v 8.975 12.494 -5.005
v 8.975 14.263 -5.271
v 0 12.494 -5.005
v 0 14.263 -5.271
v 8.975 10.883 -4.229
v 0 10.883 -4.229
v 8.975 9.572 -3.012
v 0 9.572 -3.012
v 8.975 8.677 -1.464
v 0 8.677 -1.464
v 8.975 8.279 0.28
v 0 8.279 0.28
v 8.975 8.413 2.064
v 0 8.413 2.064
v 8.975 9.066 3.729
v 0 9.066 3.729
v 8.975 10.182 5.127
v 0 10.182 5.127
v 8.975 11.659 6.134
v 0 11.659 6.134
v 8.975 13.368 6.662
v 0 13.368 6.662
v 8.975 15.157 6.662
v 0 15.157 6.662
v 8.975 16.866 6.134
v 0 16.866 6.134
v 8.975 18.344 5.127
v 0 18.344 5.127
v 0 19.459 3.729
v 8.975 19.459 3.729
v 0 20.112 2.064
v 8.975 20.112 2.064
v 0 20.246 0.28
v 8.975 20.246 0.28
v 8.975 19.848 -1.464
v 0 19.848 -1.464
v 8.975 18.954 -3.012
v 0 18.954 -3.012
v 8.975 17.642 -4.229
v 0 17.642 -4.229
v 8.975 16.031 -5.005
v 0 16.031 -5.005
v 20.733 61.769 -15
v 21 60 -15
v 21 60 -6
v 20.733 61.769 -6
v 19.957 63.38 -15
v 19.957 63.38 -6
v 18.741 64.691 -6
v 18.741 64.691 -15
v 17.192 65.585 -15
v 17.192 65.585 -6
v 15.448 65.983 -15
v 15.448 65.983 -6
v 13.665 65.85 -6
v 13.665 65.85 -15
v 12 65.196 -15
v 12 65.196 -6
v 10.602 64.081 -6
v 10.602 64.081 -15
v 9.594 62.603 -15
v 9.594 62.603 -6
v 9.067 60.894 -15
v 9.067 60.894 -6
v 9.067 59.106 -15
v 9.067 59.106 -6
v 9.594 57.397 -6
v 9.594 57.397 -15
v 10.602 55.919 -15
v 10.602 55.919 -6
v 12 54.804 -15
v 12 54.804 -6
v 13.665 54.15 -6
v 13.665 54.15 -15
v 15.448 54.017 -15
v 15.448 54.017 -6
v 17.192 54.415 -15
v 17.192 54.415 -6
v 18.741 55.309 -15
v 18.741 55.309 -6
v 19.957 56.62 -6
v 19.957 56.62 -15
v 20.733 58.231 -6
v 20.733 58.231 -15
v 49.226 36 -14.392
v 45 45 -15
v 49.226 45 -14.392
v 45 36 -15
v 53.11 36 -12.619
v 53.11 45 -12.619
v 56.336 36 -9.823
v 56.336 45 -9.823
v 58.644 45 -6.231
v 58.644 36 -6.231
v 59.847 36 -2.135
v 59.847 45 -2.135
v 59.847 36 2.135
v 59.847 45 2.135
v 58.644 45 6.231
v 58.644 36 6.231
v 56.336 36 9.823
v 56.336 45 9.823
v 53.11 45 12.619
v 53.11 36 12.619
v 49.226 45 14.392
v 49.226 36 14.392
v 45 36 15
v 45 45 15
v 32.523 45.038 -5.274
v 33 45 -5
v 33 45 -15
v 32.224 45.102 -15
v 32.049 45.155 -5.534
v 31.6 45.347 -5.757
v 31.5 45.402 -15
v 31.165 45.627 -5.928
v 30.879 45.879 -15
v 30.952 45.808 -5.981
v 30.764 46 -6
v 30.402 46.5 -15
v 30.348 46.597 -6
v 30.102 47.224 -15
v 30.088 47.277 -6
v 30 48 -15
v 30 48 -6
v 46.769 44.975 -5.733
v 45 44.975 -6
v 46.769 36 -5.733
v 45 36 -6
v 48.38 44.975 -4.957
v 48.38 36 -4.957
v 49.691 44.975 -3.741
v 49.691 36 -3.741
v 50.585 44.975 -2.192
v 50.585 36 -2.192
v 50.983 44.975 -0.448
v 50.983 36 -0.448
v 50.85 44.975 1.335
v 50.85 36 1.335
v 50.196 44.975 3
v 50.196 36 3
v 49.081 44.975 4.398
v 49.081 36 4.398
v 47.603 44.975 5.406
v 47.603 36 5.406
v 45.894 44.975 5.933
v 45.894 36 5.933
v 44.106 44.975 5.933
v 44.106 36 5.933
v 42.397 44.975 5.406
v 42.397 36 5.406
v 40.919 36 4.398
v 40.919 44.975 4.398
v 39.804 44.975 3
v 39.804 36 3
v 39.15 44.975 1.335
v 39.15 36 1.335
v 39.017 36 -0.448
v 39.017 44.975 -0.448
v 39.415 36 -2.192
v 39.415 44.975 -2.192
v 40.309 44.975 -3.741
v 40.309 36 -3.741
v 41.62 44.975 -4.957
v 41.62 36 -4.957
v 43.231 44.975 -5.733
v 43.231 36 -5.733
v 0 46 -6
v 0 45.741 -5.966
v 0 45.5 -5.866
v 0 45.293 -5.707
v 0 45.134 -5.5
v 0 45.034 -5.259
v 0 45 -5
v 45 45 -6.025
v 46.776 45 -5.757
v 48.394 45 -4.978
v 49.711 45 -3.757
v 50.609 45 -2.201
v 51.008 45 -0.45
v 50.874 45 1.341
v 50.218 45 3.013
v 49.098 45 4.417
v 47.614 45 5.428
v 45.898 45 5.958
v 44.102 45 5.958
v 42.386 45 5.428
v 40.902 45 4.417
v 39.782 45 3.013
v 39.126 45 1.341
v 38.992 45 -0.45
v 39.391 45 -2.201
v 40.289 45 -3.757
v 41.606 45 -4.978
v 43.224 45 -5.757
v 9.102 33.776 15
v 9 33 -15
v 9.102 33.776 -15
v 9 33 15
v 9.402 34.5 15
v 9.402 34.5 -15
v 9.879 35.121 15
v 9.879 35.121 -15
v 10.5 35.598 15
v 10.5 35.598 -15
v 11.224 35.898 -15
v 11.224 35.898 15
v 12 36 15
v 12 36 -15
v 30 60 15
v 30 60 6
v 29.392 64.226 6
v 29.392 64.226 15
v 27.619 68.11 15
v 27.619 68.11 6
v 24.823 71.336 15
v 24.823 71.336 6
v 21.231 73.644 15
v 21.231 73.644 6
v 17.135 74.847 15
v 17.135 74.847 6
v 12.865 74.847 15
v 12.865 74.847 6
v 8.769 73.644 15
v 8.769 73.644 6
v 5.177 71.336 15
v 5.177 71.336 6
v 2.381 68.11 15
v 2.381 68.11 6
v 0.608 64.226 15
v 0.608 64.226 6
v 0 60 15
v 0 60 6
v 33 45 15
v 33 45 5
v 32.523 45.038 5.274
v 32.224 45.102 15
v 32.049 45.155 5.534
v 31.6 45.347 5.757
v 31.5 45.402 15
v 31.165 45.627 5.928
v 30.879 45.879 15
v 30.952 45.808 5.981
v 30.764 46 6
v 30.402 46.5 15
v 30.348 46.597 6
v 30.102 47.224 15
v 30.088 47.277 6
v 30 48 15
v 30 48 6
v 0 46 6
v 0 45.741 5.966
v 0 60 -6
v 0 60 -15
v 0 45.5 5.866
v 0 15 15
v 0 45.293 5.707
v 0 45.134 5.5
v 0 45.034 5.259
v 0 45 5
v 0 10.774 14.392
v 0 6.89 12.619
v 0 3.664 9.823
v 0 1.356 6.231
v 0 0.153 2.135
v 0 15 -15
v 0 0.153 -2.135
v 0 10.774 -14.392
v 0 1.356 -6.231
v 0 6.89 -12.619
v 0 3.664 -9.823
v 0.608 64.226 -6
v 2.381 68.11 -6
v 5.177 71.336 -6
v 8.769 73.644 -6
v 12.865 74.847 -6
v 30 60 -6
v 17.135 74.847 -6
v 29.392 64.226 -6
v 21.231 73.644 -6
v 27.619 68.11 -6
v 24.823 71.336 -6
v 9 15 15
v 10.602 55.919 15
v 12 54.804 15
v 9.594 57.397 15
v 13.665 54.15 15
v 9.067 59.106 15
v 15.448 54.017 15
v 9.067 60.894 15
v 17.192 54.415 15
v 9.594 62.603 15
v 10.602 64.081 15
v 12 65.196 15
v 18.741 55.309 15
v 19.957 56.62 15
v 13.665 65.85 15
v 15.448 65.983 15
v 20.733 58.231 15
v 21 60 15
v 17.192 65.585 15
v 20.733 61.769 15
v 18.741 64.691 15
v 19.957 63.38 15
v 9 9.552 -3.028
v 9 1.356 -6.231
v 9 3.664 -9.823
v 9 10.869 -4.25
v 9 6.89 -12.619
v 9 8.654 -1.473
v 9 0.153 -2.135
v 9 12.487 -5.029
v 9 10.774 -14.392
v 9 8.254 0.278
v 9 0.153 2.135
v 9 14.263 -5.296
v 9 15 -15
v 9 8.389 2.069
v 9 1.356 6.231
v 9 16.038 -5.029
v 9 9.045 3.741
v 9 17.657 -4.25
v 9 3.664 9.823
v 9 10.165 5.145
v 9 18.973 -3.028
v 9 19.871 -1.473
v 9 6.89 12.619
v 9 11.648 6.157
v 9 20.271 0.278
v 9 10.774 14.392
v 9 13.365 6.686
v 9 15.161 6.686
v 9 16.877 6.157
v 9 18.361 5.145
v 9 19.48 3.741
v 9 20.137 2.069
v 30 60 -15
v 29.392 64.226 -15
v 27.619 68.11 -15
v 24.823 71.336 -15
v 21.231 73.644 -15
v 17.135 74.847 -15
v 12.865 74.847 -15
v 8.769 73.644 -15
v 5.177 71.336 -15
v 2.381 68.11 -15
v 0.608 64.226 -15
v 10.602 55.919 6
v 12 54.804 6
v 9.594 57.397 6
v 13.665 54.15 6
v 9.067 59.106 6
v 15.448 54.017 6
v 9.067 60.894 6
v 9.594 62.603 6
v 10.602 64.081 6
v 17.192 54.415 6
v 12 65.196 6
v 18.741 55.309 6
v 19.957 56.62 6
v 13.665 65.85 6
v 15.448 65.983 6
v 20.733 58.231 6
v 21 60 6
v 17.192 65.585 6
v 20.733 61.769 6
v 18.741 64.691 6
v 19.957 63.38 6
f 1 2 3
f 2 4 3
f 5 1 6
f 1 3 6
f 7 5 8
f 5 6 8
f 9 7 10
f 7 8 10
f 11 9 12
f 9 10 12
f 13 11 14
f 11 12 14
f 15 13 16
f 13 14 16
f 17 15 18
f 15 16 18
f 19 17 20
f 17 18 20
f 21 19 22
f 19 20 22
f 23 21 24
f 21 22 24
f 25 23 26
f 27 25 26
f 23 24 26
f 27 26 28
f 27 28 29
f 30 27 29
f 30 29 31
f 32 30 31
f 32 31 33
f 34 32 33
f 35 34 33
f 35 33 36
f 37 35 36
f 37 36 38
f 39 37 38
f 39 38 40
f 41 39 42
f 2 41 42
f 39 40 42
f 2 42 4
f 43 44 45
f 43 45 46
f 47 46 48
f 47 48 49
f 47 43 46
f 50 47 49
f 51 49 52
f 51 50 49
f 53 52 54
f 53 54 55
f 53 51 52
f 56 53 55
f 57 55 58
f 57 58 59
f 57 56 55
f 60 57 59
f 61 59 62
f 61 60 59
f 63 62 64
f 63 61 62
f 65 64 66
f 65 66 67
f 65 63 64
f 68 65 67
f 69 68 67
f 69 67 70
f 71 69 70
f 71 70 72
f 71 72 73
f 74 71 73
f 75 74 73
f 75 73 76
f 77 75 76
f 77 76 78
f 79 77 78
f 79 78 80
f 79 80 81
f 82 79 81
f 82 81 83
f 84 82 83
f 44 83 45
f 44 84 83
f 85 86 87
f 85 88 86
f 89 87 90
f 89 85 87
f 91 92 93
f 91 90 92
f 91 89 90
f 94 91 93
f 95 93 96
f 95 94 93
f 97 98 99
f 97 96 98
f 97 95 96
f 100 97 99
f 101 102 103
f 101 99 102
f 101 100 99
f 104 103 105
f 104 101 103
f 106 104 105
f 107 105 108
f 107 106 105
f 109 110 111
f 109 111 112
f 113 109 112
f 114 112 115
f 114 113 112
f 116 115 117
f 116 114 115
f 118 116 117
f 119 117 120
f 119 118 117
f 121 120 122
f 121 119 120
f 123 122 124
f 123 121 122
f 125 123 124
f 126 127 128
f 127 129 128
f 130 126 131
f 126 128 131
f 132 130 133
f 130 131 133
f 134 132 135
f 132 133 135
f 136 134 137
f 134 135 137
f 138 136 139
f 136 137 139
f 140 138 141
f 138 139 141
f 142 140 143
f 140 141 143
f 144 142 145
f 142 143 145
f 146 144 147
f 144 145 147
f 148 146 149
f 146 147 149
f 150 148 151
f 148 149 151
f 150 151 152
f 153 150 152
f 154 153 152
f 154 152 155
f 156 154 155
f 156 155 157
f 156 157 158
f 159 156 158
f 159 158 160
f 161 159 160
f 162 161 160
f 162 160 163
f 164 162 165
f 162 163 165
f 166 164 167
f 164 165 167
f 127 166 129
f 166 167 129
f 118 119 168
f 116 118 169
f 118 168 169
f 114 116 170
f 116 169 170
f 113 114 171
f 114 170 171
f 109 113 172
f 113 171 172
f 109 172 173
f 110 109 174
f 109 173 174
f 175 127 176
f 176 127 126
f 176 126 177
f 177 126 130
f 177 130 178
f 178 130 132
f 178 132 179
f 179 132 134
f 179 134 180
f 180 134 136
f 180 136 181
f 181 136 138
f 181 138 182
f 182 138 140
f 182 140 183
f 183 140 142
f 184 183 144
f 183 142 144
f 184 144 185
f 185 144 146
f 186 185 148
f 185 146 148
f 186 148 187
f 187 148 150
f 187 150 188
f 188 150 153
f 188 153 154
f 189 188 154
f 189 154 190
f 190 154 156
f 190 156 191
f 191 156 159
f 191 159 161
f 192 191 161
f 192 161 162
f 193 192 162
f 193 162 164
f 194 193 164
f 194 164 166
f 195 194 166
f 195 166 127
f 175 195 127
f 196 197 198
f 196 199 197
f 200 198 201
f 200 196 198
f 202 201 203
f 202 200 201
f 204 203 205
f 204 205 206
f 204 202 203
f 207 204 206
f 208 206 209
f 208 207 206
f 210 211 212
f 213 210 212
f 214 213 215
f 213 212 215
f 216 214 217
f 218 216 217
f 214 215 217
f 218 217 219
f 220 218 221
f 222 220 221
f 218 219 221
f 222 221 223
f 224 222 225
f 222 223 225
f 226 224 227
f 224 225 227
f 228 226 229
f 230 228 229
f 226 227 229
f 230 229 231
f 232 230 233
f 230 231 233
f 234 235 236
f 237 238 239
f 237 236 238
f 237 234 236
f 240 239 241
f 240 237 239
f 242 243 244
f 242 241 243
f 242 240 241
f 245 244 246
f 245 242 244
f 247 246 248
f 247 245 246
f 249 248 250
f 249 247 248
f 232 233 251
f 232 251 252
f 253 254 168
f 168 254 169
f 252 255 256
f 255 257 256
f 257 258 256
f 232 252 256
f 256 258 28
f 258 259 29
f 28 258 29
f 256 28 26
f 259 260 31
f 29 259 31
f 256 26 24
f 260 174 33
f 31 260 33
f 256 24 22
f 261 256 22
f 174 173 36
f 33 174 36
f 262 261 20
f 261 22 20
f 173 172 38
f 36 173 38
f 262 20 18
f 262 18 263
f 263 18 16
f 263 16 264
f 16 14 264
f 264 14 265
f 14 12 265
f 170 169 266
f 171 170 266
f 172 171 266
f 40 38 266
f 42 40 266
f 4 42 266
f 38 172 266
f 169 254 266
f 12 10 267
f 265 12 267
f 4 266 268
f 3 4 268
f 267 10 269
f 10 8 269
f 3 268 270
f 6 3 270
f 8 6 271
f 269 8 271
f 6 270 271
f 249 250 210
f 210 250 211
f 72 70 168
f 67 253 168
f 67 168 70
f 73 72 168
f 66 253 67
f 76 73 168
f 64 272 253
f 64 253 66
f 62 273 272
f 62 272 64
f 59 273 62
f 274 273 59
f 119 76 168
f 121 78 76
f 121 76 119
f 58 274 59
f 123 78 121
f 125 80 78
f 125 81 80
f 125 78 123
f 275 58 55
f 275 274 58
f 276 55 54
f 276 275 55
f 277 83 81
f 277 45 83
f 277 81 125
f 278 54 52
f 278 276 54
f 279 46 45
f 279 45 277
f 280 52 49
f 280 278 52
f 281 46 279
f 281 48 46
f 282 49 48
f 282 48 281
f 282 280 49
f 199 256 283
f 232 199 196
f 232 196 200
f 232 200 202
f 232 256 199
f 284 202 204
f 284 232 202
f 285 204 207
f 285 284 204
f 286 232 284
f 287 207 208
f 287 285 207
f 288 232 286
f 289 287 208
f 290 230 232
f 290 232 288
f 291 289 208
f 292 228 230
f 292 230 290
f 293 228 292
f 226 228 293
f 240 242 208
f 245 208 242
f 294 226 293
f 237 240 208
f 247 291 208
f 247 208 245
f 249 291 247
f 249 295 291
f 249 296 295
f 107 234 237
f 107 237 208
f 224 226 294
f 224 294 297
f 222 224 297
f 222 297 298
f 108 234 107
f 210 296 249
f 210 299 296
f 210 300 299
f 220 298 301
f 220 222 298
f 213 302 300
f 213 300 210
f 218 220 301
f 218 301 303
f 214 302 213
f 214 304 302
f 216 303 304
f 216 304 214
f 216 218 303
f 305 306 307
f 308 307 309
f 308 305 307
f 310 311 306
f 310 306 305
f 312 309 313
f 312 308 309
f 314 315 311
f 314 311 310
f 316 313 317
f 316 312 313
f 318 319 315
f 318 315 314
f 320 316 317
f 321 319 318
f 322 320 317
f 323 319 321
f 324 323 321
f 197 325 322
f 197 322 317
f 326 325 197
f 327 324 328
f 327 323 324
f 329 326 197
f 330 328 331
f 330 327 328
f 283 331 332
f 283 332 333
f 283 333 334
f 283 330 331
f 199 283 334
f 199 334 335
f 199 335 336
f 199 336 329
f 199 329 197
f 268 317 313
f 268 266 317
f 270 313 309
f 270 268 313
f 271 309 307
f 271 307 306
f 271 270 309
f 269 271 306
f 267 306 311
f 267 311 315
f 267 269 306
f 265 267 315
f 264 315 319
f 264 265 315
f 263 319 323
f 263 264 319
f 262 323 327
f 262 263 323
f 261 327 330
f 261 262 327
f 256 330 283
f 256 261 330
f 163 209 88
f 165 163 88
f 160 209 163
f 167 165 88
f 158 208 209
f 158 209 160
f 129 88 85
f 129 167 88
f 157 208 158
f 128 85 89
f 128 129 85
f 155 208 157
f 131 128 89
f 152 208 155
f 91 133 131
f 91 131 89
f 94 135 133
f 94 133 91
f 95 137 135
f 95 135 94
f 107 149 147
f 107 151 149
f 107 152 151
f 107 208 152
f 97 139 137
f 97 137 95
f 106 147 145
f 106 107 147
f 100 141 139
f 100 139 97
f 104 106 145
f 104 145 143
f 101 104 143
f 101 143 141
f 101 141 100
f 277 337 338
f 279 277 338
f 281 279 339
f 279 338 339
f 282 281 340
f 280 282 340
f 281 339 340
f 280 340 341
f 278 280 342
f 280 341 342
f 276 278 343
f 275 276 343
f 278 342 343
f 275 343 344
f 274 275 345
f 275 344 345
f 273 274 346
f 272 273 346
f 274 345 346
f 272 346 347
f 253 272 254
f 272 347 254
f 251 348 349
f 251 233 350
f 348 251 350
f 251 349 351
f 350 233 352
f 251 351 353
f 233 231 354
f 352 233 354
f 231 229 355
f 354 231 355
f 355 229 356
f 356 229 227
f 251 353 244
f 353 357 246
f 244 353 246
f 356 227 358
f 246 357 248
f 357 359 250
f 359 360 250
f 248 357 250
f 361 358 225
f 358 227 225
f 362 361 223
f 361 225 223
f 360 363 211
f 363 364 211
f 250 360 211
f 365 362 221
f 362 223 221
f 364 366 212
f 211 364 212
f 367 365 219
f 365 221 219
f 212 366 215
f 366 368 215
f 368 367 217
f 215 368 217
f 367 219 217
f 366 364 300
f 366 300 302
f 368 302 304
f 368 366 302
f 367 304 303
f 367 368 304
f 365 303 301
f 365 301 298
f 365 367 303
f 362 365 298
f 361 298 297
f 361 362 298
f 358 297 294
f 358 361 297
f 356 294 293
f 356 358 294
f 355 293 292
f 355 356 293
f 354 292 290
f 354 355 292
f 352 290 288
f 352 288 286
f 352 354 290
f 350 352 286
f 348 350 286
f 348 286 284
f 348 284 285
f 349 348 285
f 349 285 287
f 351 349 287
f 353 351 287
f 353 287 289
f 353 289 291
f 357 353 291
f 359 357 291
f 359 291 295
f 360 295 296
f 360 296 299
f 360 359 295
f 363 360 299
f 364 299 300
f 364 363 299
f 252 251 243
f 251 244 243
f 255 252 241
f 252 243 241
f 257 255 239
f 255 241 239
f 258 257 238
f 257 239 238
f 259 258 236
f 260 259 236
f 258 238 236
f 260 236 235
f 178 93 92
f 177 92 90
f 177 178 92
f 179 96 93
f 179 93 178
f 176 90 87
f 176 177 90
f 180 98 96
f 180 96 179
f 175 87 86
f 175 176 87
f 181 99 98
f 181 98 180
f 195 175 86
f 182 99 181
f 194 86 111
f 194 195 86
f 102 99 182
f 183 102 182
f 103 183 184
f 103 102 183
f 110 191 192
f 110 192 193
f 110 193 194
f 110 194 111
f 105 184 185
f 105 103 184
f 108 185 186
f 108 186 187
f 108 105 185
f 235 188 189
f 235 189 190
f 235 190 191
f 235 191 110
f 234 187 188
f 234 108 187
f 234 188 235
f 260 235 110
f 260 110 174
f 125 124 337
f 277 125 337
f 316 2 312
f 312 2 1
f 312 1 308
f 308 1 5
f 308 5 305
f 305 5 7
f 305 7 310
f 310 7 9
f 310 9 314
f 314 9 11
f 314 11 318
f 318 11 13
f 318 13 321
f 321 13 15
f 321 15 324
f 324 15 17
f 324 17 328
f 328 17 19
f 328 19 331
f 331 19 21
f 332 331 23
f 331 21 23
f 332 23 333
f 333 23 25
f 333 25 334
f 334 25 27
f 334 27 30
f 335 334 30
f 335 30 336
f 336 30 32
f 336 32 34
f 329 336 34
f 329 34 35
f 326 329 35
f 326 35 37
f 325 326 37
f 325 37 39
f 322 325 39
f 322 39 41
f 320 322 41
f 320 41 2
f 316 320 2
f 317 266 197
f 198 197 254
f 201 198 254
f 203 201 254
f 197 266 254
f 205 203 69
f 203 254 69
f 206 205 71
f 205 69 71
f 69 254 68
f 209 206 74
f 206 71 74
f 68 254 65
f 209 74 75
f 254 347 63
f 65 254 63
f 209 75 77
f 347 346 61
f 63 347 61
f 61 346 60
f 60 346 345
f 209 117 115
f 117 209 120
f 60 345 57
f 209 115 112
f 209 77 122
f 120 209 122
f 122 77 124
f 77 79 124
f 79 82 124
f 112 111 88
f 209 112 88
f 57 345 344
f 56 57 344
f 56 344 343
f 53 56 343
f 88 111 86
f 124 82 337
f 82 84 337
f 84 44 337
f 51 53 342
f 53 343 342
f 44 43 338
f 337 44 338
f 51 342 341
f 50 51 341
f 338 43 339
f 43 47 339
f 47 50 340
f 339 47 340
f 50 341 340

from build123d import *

# Parameters (mm, degrees)
BOSS_EXTRUDE1_DEPTH                        = 15
BOSS_EXTRUDE2_START                        = 6
SKETCH1_3_R                                = 6
BOSS_EXTRUDE2_DEPTH                        = 9
BOSS_EXTRUDE3_START                        = -15
SKETCH1_4_R                                = 6
BOSS_EXTRUDE3_DEPTH                        = 9
FILLET1_RADIUS                             = 15
FILLET1_LENGTH                             = 9
FILLET2_RADIUS                             = 15
FILLET2_LENGTH                             = 9
F_12_0MM_DOWEL_HOLE1_D                     = 12
F_12_0MM_DOWEL_HOLE1_CSINK_D               = 12.05
F_12_0MM_DOWEL_HOLE1_CSINK_ANGLE           = 90
F_12_0MM_DOWEL_HOLE1_ON_FACE_2_D           = 12
F_12_0MM_DOWEL_HOLE1_ON_FACE_2_CSINK_D     = 12.05
F_12_0MM_DOWEL_HOLE1_ON_FACE_2_CSINK_ANGLE = 90
FILLET3_R                                  = 3
FILLET4_R                                  = 3
FILLET5_R                                  = 1


with BuildPart() as part:
    # Sketch1 → Boss-Extrude1 (new, symmetric)
    with BuildSketch(Plane.XY):
        Polygon((0, 45), (0, 0), (9, 0), (9, 36), (60, 36), (60, 45), (30, 45), align=None)
    extrude(amount=BOSS_EXTRUDE1_DEPTH, both=True)

    # Sketch1<3> → Boss-Extrude2 (add)
    with BuildSketch(Plane.XY.offset(BOSS_EXTRUDE2_START)):
        with BuildLine():
            Line((0, 60), (0, 45))
            Line((0, 45), (30, 45))
            Line((30, 45), (30, 60))
            ThreePointArc((30, 60), (15, 75), (0, 60))
        make_face()
        with Locations((15, 60)):
            Circle(SKETCH1_3_R, mode=Mode.SUBTRACT)
    extrude(amount=BOSS_EXTRUDE2_DEPTH)

    # Sketch1<4> → Boss-Extrude3 (add)
    with BuildSketch(Plane.XY.offset(BOSS_EXTRUDE3_START)):
        with BuildLine():
            Line((0, 60), (0, 45))
            Line((0, 45), (30, 45))
            Line((30, 45), (30, 60))
            ThreePointArc((30, 60), (15, 75), (0, 60))
        make_face()
        with Locations((15, 60)):
            Circle(SKETCH1_4_R, mode=Mode.SUBTRACT)
    extrude(amount=BOSS_EXTRUDE3_DEPTH)

    # Fillet1: full round fillet: the end face becomes a half cylinder, R = half its width
    fillet1_face = Plane((60, 40.5, 0), x_dir=(0, -1, 0), z_dir=(1, 0, 0))  # on the end face: x along it, z out of the body
    fillet1_slab = fillet1_face.offset(-FILLET1_RADIUS / 2) * Box(FILLET1_LENGTH, 2 * FILLET1_RADIUS, FILLET1_RADIUS, mode=Mode.PRIVATE)  # the body's end, R deep
    fillet1_round = Plane((45, 40.5, 0), x_dir=(1, 0, 0), z_dir=(0, -1, 0)) * Cylinder(FILLET1_RADIUS, FILLET1_LENGTH, mode=Mode.PRIVATE)  # its axis R under the face
    add(fillet1_slab - fillet1_round, mode=Mode.SUBTRACT)

    # Fillet2: full round fillet: the end face becomes a half cylinder, R = half its width
    fillet2_face = Plane((4.5, 0, 0), x_dir=(-1, 0, 0), z_dir=(0, -1, 0))  # on the end face: x along it, z out of the body
    fillet2_slab = fillet2_face.offset(-FILLET2_RADIUS / 2) * Box(FILLET2_LENGTH, 2 * FILLET2_RADIUS, FILLET2_RADIUS, mode=Mode.PRIVATE)  # the body's end, R deep
    fillet2_round = Plane((4.5, 15, 0), x_dir=(0, -1, 0), z_dir=(-1, 0, 0)) * Cylinder(FILLET2_RADIUS, FILLET2_LENGTH, mode=Mode.PRIVATE)  # its axis R under the face
    add(fillet2_slab - fillet2_round, mode=Mode.SUBTRACT)

    # Ø12.0mm Dowel Hole1 (through all)
    with Locations(Plane(origin=(9, 14.262563745, 0.728544171), x_dir=(0, 0, 1), z_dir=(1, 0, 0))):
        with Locations((0, 0)):
            CounterSinkHole(F_12_0MM_DOWEL_HOLE1_D / 2, F_12_0MM_DOWEL_HOLE1_CSINK_D / 2, counter_sink_angle=F_12_0MM_DOWEL_HOLE1_CSINK_ANGLE)

    # Ø12.0mm Dowel Hole1 on face 2 (through all)
    with Locations(Plane(origin=(45, 45, 0), x_dir=(0, 0, 1), z_dir=(0, 1, 0))):
        with Locations((0, 0)):
            CounterSinkHole(F_12_0MM_DOWEL_HOLE1_ON_FACE_2_D / 2, F_12_0MM_DOWEL_HOLE1_ON_FACE_2_CSINK_D / 2, counter_sink_angle=F_12_0MM_DOWEL_HOLE1_ON_FACE_2_CSINK_ANGLE)

    # Fillet3
    fillet3_edges = [part.edges().sort_by_distance(p)[0] for p in [
        (9, 36, 0),
    ]]
    fillet(fillet3_edges, radius=FILLET3_R)

    # Fillet4
    fillet4_edges = [part.edges().sort_by_distance(p)[0] for p in [
        (30, 45, 10.5),
        (30, 45, -10.5),
    ]]
    fillet(fillet4_edges, radius=FILLET4_R)

    # Fillet5
    fillet5_edges = [part.edges().sort_by_distance(p)[0] for p in [
        (16.5, 45, 6),
        (16.5, 45, -6),
    ]]
    fillet(fillet5_edges, radius=FILLET5_R)


solid = part.part
